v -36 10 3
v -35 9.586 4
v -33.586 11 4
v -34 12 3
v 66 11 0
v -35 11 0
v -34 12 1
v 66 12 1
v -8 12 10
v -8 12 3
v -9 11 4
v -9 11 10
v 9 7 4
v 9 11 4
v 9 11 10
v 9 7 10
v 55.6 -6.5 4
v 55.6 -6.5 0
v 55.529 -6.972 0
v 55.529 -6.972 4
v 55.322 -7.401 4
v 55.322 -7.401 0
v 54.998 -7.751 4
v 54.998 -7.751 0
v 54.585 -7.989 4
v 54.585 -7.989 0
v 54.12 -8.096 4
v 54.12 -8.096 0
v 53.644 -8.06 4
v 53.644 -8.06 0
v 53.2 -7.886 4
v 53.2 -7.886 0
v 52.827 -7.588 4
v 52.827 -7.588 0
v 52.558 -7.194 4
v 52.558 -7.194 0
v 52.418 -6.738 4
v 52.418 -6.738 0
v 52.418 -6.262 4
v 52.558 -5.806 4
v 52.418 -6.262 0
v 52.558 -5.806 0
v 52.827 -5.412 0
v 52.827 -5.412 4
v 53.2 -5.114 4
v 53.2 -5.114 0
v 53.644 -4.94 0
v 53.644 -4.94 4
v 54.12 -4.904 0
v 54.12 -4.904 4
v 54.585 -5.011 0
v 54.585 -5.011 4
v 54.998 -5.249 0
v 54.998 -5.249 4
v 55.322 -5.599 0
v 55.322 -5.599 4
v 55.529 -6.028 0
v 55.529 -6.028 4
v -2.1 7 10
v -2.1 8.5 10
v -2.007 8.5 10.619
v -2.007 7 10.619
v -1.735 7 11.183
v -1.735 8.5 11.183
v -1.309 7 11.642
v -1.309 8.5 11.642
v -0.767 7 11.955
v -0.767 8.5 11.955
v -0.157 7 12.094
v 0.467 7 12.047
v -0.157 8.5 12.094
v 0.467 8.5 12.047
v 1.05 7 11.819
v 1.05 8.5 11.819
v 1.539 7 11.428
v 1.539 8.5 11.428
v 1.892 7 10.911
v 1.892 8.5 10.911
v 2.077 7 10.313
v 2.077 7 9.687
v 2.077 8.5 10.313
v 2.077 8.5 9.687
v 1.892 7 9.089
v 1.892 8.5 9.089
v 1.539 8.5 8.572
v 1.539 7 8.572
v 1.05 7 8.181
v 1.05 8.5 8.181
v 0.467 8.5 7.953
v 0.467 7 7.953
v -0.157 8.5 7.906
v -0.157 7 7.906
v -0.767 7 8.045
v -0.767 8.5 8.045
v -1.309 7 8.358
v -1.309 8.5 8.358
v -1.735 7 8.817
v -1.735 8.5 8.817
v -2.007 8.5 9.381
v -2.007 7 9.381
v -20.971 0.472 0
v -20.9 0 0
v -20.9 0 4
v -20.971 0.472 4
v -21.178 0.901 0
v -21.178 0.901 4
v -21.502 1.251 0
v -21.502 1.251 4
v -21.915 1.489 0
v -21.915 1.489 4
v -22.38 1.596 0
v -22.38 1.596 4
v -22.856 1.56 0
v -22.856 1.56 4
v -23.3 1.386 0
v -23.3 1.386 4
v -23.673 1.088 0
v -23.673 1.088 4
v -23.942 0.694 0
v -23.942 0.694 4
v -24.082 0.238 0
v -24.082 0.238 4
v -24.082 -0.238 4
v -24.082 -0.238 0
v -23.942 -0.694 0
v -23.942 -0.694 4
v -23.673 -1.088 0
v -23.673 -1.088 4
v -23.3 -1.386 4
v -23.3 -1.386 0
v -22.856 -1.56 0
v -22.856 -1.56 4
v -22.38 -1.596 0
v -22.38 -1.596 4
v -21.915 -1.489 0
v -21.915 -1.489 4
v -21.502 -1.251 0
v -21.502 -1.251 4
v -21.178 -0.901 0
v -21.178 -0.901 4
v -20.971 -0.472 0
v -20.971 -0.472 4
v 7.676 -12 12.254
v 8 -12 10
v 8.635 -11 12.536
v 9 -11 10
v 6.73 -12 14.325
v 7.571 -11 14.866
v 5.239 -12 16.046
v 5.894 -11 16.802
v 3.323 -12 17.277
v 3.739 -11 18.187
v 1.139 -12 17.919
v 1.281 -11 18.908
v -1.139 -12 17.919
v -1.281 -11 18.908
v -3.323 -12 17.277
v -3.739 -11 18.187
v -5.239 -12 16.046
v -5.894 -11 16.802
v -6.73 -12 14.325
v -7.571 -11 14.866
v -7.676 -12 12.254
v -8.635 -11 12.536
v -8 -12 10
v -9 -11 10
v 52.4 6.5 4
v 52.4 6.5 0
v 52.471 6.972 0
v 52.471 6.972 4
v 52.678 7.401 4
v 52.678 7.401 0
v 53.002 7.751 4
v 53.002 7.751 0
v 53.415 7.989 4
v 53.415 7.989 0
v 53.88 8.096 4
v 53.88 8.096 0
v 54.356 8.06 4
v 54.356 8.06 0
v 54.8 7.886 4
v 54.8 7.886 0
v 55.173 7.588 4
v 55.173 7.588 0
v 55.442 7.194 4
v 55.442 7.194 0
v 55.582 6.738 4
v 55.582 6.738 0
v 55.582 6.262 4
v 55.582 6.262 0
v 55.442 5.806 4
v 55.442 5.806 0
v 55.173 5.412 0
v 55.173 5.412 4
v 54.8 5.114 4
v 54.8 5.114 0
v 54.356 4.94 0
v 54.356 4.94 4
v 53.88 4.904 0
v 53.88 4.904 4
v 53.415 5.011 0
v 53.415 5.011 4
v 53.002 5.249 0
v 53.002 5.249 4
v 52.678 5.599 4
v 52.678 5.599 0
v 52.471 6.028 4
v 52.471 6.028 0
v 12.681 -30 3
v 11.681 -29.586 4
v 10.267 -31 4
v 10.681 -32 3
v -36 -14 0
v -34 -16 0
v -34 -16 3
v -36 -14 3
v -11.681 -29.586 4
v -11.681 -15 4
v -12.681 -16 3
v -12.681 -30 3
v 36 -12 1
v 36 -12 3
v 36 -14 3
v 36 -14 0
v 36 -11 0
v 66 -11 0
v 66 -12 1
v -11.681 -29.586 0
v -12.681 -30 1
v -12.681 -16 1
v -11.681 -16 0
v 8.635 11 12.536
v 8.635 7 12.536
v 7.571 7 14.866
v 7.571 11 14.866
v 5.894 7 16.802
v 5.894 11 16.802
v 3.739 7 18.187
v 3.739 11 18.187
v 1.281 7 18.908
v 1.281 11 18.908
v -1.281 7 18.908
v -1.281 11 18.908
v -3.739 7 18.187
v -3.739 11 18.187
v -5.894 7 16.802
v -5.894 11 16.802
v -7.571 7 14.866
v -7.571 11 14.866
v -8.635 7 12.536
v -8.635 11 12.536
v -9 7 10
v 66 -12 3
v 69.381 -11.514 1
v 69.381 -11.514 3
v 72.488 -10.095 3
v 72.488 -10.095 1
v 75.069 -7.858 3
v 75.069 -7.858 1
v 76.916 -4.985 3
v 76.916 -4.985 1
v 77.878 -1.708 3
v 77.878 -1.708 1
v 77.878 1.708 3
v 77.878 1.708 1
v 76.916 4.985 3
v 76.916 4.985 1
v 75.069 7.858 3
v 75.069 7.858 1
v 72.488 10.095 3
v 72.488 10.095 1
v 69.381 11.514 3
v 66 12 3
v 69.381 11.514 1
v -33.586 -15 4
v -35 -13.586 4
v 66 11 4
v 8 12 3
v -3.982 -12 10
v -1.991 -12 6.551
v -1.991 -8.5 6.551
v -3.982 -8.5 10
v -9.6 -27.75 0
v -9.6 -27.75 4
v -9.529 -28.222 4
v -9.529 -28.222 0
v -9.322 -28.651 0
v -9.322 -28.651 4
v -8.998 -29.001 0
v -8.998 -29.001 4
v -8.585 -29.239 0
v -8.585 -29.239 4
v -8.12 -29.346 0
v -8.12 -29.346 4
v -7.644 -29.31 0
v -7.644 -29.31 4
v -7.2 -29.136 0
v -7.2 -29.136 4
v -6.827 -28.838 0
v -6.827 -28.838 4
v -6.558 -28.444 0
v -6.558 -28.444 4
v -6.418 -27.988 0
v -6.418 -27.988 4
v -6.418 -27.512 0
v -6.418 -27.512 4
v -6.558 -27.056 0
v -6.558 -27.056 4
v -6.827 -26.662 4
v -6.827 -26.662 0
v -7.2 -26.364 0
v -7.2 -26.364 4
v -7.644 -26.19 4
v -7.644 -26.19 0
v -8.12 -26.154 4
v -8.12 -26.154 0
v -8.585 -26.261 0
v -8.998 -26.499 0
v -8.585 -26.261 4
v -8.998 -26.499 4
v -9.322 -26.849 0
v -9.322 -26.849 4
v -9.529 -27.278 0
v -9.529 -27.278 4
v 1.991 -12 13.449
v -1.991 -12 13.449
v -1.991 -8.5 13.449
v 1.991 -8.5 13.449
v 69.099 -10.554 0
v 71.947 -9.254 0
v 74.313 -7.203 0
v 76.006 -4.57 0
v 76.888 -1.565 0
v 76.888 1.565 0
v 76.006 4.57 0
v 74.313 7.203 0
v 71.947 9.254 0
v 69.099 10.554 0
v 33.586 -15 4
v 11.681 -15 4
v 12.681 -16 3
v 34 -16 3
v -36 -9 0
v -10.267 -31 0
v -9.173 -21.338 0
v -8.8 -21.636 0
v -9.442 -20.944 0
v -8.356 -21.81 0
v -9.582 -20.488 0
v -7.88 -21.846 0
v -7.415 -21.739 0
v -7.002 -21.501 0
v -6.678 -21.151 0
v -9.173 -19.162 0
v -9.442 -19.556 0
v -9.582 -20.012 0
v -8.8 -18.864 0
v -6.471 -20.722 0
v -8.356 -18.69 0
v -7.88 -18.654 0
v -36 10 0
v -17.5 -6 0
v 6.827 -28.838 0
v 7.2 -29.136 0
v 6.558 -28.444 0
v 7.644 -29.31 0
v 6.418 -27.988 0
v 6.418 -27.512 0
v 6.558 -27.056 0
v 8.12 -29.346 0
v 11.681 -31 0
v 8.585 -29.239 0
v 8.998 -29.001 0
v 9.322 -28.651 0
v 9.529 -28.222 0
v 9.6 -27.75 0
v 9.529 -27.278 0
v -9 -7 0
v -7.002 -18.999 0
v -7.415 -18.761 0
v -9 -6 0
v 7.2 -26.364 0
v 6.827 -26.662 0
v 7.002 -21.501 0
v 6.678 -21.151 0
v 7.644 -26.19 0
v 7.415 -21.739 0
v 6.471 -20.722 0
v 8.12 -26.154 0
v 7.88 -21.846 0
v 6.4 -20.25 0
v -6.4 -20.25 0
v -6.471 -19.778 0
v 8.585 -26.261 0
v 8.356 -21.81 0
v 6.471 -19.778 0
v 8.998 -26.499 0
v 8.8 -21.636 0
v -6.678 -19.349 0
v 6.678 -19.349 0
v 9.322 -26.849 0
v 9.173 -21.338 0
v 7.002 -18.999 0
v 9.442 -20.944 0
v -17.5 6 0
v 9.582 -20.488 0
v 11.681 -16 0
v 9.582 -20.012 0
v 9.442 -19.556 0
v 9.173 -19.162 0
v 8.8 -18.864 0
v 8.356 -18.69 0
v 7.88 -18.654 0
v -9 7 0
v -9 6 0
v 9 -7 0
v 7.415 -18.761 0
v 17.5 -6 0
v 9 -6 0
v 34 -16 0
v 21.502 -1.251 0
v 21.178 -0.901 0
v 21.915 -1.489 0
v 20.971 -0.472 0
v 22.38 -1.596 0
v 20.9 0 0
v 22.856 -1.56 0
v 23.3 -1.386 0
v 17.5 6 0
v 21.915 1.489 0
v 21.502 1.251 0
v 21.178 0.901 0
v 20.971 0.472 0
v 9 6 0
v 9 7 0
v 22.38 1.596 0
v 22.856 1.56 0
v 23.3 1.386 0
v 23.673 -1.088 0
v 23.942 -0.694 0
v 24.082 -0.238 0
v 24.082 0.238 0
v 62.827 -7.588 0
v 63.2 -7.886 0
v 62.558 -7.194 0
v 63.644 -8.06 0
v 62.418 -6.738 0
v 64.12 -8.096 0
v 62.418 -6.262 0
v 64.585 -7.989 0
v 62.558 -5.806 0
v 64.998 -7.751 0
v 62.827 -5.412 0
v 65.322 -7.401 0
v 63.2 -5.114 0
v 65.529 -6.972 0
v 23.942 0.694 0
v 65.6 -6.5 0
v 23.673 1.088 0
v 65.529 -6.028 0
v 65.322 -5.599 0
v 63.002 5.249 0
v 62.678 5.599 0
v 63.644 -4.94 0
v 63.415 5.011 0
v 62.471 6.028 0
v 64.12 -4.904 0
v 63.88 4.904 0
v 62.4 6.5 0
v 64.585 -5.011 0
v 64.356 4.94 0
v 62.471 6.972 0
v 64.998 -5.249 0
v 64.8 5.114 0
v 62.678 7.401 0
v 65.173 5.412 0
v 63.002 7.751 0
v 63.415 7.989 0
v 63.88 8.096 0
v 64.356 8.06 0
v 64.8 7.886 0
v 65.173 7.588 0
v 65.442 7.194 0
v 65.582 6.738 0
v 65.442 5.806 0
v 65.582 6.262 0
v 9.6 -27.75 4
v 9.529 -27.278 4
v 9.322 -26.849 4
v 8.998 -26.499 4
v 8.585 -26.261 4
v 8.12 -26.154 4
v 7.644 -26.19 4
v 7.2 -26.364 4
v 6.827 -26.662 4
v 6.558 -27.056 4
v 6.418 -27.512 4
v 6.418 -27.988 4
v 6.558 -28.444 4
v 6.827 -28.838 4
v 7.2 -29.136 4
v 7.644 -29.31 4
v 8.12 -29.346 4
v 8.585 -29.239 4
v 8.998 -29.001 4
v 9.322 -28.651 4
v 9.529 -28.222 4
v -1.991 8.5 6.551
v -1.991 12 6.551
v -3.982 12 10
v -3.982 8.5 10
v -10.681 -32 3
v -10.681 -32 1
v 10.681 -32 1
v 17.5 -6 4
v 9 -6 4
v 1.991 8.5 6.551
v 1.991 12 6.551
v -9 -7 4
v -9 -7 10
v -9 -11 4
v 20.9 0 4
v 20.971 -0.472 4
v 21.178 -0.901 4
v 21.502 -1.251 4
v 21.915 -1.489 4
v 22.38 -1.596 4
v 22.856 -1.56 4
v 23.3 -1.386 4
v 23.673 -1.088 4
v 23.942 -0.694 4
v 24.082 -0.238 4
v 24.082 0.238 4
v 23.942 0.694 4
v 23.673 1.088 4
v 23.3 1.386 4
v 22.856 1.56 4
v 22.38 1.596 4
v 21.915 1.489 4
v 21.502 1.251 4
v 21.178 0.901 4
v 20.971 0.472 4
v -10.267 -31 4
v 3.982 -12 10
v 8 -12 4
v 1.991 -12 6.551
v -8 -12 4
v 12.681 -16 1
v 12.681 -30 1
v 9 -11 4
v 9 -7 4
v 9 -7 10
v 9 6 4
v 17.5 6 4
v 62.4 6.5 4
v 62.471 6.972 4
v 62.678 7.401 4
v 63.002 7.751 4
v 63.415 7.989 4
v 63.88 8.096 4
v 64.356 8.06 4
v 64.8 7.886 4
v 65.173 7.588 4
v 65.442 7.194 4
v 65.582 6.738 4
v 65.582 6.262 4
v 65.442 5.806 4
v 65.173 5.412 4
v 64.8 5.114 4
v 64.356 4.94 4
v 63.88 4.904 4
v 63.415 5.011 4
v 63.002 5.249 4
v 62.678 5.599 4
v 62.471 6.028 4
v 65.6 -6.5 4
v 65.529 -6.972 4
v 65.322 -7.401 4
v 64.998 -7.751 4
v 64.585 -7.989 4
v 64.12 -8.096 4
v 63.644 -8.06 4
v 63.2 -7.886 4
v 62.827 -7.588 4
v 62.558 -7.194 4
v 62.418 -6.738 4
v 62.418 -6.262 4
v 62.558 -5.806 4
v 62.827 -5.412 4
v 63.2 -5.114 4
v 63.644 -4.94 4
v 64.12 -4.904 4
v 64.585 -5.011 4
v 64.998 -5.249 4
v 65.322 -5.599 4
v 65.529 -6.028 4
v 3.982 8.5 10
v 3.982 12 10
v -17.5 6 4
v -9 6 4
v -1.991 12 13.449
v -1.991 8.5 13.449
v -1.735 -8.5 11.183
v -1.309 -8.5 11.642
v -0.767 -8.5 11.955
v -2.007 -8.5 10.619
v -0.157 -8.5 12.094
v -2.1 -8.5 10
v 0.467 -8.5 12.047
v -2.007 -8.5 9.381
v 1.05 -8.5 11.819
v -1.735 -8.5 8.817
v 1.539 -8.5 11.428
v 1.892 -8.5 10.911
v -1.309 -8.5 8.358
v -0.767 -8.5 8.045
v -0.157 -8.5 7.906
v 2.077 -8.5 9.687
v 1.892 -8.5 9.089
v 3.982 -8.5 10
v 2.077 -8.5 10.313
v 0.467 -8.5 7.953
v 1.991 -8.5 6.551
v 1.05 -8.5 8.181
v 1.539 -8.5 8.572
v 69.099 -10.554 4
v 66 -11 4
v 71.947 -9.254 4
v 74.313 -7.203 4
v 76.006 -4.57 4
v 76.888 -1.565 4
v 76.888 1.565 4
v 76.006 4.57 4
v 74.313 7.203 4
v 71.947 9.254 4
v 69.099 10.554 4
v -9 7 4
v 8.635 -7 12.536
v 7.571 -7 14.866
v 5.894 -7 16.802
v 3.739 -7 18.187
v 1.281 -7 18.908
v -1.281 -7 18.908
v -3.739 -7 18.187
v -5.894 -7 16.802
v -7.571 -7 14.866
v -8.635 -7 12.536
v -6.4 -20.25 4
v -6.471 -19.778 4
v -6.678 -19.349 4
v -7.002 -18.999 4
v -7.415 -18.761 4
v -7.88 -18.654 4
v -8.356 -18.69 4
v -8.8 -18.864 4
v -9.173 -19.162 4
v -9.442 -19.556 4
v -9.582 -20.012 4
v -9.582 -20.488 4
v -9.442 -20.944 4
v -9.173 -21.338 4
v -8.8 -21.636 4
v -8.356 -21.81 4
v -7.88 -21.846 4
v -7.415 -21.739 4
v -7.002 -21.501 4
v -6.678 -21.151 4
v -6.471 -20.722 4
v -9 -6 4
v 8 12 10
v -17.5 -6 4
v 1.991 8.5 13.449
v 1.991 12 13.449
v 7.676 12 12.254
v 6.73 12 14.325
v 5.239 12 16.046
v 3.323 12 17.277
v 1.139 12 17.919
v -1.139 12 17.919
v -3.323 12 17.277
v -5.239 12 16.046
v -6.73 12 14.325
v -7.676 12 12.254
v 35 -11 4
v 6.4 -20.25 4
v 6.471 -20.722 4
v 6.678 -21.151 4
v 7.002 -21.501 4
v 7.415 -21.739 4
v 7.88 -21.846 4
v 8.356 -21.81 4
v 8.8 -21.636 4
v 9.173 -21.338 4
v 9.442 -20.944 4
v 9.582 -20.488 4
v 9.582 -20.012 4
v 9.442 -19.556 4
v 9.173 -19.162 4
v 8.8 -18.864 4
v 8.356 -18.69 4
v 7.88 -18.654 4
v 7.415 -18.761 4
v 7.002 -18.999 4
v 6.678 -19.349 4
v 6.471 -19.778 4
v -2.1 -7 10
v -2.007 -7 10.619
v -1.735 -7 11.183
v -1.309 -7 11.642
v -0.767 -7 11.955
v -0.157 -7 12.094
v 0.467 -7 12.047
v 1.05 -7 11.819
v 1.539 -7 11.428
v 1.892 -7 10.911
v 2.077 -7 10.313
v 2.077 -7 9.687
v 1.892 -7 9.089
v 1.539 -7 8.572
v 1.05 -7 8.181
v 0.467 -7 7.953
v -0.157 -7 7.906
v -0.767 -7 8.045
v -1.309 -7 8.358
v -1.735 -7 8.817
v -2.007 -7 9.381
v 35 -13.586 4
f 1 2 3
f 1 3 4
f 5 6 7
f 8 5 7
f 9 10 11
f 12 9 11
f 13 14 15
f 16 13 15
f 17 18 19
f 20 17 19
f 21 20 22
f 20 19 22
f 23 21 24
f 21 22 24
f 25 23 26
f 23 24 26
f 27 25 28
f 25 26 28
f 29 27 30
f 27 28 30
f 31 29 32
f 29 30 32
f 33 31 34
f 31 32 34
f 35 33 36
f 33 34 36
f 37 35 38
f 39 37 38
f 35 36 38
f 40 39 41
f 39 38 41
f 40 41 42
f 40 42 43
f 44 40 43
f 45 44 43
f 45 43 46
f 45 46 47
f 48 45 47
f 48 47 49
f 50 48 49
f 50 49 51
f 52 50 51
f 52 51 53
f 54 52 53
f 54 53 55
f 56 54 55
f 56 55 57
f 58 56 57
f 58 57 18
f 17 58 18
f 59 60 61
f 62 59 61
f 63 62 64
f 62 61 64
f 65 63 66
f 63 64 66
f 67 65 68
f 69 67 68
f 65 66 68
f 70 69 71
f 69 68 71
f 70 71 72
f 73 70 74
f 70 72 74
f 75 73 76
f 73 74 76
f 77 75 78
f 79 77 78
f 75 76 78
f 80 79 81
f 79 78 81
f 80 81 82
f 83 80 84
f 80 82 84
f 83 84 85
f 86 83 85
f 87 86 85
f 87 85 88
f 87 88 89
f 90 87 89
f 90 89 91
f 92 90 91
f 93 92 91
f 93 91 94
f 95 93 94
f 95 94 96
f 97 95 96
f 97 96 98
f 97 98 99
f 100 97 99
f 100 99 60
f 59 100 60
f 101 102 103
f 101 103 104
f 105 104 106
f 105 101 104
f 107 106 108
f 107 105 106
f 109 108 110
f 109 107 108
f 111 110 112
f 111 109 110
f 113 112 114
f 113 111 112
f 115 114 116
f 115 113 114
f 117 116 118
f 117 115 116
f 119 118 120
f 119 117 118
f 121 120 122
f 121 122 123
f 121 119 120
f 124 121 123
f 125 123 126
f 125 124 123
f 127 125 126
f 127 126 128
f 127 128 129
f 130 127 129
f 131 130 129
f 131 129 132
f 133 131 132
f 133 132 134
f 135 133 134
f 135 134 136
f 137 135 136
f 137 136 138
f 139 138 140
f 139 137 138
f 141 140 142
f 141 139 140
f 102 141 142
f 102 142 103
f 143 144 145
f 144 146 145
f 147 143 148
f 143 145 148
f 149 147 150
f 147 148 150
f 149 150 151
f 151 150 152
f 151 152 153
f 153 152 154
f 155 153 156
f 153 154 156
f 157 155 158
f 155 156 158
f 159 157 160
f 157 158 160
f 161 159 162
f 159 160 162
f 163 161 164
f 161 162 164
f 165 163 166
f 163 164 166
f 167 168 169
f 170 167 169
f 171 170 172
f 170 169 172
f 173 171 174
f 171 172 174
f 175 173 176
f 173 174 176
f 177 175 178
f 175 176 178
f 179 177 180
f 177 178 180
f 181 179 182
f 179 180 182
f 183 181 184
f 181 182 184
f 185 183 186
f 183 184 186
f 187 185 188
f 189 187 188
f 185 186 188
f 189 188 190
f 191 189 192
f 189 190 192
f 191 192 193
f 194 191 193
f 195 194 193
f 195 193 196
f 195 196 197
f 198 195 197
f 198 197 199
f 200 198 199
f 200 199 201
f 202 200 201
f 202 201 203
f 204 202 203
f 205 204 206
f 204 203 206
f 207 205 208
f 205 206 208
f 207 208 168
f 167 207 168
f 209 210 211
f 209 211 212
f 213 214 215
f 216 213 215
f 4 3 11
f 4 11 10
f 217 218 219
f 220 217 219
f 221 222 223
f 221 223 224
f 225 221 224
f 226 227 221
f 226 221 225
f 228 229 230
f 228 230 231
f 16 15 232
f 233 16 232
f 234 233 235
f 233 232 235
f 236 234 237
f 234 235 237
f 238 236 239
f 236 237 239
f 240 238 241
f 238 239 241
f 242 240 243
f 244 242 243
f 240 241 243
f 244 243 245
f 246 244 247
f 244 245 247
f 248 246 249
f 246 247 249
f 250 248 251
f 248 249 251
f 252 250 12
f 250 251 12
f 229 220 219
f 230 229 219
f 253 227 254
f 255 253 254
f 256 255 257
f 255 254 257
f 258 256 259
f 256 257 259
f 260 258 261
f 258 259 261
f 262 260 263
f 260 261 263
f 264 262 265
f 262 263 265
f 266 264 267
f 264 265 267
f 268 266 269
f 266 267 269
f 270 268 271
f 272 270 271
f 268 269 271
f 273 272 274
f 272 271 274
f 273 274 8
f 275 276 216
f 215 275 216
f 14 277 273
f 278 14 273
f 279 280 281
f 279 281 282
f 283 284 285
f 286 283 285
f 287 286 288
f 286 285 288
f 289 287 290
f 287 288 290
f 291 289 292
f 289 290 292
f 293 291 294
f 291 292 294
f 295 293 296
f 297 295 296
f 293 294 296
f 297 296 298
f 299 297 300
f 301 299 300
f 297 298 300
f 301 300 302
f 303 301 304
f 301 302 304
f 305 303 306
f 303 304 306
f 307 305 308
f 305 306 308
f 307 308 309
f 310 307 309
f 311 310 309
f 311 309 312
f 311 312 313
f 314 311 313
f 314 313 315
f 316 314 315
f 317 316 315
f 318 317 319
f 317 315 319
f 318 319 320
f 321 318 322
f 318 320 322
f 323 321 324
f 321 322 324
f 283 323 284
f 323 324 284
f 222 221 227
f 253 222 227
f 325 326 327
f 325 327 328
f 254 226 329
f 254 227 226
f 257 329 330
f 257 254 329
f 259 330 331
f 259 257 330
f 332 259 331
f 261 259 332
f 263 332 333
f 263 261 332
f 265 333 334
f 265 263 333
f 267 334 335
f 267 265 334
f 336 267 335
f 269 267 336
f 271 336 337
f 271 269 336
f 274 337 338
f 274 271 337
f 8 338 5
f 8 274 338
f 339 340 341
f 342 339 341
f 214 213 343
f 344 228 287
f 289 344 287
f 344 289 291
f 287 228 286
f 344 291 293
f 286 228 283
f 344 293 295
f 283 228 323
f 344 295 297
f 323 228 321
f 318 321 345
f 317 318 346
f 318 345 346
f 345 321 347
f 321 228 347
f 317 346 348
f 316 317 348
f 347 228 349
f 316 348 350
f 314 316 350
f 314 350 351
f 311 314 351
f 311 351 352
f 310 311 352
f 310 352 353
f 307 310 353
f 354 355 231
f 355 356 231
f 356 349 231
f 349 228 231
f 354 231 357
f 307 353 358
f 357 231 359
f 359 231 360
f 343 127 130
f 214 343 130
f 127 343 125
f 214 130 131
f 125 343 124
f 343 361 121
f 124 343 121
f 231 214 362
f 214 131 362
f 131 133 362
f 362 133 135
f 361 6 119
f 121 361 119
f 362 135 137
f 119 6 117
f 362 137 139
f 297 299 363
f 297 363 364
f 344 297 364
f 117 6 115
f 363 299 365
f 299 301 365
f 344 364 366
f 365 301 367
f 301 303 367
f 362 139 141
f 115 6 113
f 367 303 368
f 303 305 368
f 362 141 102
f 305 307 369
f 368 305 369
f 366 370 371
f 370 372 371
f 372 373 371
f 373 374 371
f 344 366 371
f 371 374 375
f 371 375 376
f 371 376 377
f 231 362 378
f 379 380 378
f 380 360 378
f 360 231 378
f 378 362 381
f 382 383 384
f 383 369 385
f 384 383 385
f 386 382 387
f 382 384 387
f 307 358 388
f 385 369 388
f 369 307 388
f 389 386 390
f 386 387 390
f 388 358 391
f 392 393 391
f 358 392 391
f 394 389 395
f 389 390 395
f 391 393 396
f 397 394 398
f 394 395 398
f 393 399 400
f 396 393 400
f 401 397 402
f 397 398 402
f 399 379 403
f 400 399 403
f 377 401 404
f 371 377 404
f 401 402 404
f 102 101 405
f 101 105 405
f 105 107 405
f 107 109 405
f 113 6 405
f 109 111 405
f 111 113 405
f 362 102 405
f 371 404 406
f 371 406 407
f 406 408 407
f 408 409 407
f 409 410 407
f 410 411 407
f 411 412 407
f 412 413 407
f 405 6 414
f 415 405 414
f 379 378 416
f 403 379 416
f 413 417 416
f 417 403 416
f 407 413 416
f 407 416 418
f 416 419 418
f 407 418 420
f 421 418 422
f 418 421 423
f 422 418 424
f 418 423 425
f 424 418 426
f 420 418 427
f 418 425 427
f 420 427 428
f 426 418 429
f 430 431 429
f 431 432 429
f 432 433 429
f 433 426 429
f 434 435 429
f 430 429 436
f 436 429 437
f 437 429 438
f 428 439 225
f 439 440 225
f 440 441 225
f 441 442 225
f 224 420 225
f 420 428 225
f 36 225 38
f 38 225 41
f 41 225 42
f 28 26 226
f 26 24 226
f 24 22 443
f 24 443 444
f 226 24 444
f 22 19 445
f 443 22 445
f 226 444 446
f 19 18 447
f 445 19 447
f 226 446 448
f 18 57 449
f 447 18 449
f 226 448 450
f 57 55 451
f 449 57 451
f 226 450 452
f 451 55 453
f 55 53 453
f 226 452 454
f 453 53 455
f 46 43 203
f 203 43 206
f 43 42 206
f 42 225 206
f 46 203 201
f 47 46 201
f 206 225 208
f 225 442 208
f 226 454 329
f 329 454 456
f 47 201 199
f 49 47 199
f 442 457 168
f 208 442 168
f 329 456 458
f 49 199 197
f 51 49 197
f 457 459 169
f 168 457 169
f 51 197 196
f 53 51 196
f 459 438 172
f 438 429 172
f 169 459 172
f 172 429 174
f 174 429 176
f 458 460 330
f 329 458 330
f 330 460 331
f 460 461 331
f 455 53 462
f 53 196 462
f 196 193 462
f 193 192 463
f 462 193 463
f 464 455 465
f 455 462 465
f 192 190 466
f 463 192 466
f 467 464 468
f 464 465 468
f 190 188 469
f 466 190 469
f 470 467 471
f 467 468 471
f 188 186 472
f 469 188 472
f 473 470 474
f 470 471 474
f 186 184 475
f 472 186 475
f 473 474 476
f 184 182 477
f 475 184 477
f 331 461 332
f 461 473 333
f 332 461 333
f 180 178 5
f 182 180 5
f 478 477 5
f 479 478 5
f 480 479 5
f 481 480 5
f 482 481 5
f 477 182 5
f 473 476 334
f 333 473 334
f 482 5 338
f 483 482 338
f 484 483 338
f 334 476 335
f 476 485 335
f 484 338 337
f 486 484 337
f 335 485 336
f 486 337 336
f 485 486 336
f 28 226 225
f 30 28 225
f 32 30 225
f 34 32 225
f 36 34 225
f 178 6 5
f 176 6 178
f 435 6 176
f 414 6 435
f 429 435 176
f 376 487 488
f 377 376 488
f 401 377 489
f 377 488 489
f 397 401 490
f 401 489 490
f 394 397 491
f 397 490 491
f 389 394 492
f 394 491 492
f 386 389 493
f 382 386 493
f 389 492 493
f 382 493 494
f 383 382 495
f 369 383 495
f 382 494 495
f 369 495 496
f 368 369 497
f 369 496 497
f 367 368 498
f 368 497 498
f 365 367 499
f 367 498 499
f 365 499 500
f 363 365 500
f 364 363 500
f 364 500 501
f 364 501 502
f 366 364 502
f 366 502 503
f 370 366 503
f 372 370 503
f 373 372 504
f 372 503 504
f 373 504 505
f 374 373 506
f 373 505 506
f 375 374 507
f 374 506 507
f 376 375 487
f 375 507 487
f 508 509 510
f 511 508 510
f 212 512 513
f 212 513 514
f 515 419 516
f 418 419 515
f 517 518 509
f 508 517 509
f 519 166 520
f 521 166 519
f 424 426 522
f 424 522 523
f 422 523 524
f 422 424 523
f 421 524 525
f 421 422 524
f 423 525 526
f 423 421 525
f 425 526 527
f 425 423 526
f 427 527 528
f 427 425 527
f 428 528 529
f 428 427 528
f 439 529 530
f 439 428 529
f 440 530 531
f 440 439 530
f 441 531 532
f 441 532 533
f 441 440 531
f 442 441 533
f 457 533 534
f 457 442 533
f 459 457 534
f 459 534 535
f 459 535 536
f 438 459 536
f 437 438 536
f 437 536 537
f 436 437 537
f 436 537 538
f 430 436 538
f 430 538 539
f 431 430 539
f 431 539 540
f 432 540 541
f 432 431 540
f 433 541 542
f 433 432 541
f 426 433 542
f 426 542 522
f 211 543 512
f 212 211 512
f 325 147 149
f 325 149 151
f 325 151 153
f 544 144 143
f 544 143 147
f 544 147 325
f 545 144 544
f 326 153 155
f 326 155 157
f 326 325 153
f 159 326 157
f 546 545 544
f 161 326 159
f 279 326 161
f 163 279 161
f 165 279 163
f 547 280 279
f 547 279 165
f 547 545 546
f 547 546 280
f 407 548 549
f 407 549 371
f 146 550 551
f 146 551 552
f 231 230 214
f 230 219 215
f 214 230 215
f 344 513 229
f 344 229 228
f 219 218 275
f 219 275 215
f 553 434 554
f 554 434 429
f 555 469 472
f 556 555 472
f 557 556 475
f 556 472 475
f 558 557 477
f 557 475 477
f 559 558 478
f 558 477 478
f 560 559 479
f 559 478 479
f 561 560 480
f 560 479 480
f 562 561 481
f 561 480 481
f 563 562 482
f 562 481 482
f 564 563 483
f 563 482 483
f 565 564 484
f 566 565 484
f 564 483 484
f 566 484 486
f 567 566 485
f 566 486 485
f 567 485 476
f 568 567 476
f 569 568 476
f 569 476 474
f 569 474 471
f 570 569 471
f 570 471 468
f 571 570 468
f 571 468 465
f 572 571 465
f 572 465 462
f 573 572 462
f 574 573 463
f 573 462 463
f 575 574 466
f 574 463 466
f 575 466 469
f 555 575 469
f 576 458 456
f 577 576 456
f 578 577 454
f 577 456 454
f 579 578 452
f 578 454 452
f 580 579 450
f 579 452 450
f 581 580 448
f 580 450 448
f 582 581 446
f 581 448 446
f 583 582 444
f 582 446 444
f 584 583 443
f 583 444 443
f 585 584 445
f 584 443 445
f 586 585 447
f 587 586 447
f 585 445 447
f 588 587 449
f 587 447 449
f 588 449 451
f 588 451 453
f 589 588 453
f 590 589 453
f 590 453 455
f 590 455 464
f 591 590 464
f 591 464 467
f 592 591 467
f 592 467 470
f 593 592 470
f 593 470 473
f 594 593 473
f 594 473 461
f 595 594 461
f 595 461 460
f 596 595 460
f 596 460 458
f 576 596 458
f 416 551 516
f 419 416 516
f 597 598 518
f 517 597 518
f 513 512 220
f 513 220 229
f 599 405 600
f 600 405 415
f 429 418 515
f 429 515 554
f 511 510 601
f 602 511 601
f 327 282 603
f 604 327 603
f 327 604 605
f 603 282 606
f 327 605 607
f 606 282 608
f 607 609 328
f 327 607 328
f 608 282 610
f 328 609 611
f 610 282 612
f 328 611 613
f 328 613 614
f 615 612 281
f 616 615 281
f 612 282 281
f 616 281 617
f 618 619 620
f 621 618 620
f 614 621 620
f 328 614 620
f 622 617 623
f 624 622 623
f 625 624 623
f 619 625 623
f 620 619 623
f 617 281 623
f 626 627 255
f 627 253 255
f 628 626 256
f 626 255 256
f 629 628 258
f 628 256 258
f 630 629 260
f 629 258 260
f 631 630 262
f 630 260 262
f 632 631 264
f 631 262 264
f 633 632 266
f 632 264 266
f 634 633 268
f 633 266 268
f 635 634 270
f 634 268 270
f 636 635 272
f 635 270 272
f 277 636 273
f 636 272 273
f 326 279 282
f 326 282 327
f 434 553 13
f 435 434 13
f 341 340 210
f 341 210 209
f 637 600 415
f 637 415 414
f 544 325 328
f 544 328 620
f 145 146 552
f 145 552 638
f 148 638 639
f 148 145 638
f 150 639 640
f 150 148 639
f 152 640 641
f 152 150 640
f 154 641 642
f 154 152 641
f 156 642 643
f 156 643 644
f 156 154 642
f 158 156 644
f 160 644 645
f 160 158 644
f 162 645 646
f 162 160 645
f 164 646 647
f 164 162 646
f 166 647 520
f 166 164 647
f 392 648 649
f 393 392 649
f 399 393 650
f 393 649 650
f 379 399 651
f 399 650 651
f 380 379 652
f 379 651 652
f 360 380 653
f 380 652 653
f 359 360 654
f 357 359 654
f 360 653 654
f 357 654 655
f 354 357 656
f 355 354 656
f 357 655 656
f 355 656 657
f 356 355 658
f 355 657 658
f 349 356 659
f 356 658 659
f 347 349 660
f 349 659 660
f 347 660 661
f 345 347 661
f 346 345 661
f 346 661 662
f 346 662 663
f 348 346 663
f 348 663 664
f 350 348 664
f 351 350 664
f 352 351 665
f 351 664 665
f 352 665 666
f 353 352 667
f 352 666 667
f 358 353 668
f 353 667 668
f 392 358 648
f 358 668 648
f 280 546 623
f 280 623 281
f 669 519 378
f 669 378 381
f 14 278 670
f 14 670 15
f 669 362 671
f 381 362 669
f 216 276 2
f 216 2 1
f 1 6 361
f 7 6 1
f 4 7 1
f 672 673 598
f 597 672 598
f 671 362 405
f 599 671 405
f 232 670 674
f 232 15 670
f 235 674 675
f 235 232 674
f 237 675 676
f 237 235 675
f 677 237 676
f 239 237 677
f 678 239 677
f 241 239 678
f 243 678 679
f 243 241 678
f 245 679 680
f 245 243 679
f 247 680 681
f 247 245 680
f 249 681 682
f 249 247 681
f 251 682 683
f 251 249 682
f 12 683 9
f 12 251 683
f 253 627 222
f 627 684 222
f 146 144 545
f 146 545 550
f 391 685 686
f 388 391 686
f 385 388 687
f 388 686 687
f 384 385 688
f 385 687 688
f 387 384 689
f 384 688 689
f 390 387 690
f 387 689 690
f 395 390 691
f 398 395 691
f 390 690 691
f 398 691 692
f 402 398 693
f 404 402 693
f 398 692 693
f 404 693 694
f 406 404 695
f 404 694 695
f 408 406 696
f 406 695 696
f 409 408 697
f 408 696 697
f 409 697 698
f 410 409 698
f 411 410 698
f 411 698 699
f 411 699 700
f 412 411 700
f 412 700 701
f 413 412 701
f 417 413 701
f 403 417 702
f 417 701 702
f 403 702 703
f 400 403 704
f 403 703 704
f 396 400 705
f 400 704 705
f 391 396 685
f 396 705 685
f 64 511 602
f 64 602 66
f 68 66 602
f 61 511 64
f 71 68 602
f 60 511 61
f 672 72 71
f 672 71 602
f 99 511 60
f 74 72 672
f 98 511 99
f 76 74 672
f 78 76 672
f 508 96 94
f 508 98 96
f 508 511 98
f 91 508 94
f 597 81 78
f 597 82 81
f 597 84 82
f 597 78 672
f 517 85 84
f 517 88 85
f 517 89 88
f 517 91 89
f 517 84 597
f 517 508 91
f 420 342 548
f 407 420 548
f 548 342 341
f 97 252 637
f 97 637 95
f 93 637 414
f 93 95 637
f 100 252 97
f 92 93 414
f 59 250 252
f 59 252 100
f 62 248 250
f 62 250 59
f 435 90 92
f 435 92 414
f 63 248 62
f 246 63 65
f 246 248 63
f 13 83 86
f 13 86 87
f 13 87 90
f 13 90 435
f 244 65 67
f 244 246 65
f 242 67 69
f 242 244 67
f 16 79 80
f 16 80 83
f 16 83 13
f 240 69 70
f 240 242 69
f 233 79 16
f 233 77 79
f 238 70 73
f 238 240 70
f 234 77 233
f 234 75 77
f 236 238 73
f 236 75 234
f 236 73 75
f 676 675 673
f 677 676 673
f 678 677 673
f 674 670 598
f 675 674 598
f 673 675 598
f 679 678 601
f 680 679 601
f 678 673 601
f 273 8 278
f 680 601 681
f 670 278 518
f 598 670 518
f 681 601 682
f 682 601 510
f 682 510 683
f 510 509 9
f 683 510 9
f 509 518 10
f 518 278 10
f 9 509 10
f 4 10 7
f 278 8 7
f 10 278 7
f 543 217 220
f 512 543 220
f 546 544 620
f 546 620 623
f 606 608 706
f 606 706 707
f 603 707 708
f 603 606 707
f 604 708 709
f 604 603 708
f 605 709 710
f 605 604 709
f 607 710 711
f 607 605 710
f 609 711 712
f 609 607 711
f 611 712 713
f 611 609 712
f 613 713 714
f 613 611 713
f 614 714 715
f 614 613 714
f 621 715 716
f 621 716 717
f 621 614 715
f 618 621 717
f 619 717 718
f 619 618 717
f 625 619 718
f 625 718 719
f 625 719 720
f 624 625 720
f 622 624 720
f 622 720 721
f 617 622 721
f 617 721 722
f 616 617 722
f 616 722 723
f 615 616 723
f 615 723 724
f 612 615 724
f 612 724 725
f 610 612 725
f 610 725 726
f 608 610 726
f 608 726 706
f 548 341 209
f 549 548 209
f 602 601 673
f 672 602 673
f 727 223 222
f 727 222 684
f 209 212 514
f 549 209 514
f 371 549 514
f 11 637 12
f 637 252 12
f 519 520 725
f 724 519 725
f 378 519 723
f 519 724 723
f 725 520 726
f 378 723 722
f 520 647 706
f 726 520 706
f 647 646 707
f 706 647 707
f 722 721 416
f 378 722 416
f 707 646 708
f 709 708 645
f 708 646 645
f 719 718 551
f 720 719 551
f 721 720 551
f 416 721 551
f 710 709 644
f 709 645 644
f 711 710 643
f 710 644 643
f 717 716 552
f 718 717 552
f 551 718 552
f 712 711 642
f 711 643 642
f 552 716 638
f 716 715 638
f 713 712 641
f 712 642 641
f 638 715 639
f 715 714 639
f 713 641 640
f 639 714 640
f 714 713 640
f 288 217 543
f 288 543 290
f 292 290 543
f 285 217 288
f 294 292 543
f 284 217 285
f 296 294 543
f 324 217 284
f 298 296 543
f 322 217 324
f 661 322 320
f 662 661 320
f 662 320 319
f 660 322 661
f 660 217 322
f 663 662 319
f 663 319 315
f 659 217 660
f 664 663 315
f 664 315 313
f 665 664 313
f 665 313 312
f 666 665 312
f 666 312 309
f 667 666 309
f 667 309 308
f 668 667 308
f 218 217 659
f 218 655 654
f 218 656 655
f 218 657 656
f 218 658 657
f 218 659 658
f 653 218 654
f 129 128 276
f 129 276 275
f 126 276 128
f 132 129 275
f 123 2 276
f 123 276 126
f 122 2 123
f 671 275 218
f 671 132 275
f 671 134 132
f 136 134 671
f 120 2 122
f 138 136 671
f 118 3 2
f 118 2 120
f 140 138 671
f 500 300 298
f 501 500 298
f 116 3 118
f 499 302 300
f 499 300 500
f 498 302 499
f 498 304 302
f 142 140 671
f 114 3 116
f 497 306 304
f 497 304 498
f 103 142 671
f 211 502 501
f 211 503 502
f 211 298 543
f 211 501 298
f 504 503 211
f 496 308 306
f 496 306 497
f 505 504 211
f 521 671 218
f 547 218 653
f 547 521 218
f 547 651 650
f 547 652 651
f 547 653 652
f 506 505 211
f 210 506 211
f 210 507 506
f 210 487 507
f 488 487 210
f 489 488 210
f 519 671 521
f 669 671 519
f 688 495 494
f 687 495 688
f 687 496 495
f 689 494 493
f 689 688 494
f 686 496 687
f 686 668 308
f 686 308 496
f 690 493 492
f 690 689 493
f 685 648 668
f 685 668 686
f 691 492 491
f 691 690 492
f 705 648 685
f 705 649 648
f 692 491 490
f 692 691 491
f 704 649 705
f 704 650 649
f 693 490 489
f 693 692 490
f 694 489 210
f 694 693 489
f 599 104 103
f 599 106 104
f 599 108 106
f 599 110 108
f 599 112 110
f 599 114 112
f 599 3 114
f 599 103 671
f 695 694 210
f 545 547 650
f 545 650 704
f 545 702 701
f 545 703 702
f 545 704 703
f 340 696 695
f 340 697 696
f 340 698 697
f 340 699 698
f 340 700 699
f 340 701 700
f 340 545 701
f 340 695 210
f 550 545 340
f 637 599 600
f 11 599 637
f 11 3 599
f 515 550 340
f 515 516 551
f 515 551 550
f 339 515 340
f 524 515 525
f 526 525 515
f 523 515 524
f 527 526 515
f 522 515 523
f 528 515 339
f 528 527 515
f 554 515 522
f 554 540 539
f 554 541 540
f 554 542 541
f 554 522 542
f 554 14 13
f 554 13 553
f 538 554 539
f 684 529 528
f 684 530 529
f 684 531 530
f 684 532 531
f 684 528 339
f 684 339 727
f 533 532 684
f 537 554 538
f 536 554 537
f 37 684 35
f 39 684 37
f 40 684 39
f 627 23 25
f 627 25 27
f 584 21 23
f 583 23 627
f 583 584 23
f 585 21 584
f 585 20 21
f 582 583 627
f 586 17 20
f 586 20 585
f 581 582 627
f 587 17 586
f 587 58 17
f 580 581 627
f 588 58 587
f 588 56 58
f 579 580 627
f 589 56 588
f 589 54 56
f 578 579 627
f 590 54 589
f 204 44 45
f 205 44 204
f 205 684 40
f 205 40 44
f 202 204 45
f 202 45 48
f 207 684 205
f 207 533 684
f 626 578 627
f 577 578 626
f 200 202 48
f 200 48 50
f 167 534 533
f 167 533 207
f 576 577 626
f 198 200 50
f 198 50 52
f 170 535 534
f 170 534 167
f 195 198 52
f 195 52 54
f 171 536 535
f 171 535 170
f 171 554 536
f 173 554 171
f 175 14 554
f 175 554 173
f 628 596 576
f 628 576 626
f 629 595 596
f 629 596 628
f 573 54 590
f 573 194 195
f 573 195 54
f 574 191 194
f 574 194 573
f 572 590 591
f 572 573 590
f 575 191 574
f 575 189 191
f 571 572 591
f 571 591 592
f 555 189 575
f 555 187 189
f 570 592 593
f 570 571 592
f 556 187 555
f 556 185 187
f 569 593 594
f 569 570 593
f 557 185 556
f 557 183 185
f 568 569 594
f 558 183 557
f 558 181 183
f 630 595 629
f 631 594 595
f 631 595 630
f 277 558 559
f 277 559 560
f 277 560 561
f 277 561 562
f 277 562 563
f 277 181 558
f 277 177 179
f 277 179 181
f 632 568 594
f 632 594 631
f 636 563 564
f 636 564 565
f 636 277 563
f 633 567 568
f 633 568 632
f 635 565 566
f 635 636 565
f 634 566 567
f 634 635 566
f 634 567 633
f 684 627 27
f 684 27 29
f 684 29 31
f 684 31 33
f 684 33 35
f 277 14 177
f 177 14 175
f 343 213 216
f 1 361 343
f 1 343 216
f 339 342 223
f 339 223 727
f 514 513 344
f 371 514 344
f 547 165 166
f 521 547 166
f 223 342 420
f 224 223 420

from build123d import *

# Parameters (mm, degrees)
CROQUIS1_W              = 72
CROQUIS1_H              = 24
CROQUIS1_R              = 1.6
CROQUIS1_W_2            = 35
CROQUIS1_H_2            = 12
SALIENTE_EXTRUIR1_DEPTH = 4
CROQUIS2_R              = 3.125
SALIENTE_EXTRUIR2_DEPTH = 4
CROQUIS3_R              = 1.6
SALIENTE_EXTRUIR3_DEPTH = 4
CROQUIS5_R              = 2.1
SALIENTE_EXTRUIR4_DEPTH = 5
CORTAR_EXTRUIR1_DEPTH   = 3.5
REDONDEO1_R             = 3
CROQUIS7_W              = 25.361567636
CROQUIS7_H              = 16
CROQUIS7_R              = 1.6
SALIENTE_EXTRUIR5_DEPTH = 4
CHAFL_N1_SIZE           = 2
CHAFL_N2_SIZE           = 1
CROQUIS8_W              = 18
CROQUIS8_H              = 14
CORTAR_EXTRUIR2_DEPTH   = 87.423376467
CROQUIS9_W              = 19.069204895
CROQUIS9_H              = 8.04839492
CORTAR_EXTRUIR3_DEPTH   = 120.920807202


with BuildPart() as part:
    # Croquis1 → Saliente-Extruir1 (new body)
    with BuildSketch(Plane.XY):
        Rectangle(CROQUIS1_W, CROQUIS1_H)
        with Locations((-22.5, 0)):
            Circle(CROQUIS1_R, mode=Mode.SUBTRACT)
        with Locations(Location((22.5, 0, 0), (0, 0, 180))):
            Circle(CROQUIS1_R, mode=Mode.SUBTRACT)
        Rectangle(CROQUIS1_W_2, CROQUIS1_H_2, mode=Mode.SUBTRACT)
    extrude(amount=SALIENTE_EXTRUIR1_DEPTH)

    # Croquis2 → Saliente-Extruir2 (add)
    with BuildSketch(Plane.XZ.offset(12)):
        with BuildLine():
            Line((-5, -10), (-5, -4))
            Line((-5, -4), (-36, -4))
            Line((-36, -4), (-36, 4))
            Line((-36, 4), (36, 4))
            Line((36, 4), (36, -4))
            Line((36, -4), (5, -4))
            Line((5, -4), (5, -10))
            ThreePointArc((5, -10), (0, -15), (-5, -10))
        make_face()
        with Locations((0, -10)):
            Circle(CROQUIS2_R, mode=Mode.SUBTRACT)
    extrude(amount=SALIENTE_EXTRUIR2_DEPTH)

    # Croquis3 → Saliente-Extruir3 (add)
    with BuildSketch(Plane(origin=(0, 0, 0), x_dir=(-1, 0, 0), z_dir=(0, 0, -1))):
        with BuildLine():
            Line((-66, 12), (-36, 12))
            Line((-36, 12), (-36, -12))
            Line((-36, -12), (-66, -12))
            ThreePointArc((-66, -12), (-78, 0), (-66, 12))
        make_face()
        with Locations((-54, 6.5)):
            Circle(CROQUIS3_R, mode=Mode.SUBTRACT)
        with Locations((-64, 6.5)):
            Circle(CROQUIS3_R, mode=Mode.SUBTRACT)
        with Locations(Location((-54, -6.5, 0), (0, 0, 180))):
            Circle(CROQUIS3_R, mode=Mode.SUBTRACT)
        with Locations(Location((-64, -6.5, 0), (0, 0, 180))):
            Circle(CROQUIS3_R, mode=Mode.SUBTRACT)
    extrude(amount=-SALIENTE_EXTRUIR3_DEPTH)

    # Croquis5 → Saliente-Extruir4 (add)
    with BuildSketch(Plane(origin=(0, 12, 0), x_dir=(1, 0, 0), z_dir=(0, 1, 0))):
        with BuildLine():
            Line((-9, -10), (-9, -4))
            Line((-9, -4), (9, -4))
            Line((9, -4), (9, -10))
            ThreePointArc((9, -10), (0, -19), (-9, -10))
        make_face()
        with Locations(Location((0, -10, 0), (0, 0, 180))):
            Circle(CROQUIS5_R, mode=Mode.SUBTRACT)
    saliente_extruir4 = extrude(amount=-SALIENTE_EXTRUIR4_DEPTH)

    # Croquis6 → Cortar-Extruir1 (cut)
    with BuildSketch(Plane(origin=(0, 12, 0), x_dir=(1, 0, 0), z_dir=(0, 1, 0))):
        Polygon((3.982338332, -10), (1.991169166, -6.551193838), (-1.991169166, -6.551193838), (-3.982338332, -10), (-1.991169166, -13.448806162), (1.991169166, -13.448806162), align=None)
    cortar_extruir1 = extrude(amount=-CORTAR_EXTRUIR1_DEPTH, mode=Mode.SUBTRACT)

    # Simetría1: Saliente-Extruir4, Cortar-Extruir1 across plane
    add(saliente_extruir4.mirror(Plane.ZX))
    add(cortar_extruir1.mirror(Plane.ZX), mode=Mode.SUBTRACT)

    # Redondeo1
    redondeo1_edges = [part.edges().sort_by_distance(p)[0] for p in [
        (0, -12, 0),
    ]]
    fillet(redondeo1_edges, radius=REDONDEO1_R)

    # Croquis7 → Saliente-Extruir5 (add)
    with BuildSketch(Plane.XY.offset(4)):
        with Locations((0, -24)):
            Rectangle(CROQUIS7_W, CROQUIS7_H)
        with Locations((-8, -20.25)):
            Circle(CROQUIS7_R, mode=Mode.SUBTRACT)
        with Locations(Location((8, -20.25, 0), (0, 0, 180))):
            Circle(CROQUIS7_R, mode=Mode.SUBTRACT)
        with Locations((8, -27.75)):
            Circle(CROQUIS7_R, mode=Mode.SUBTRACT)
        with Locations(Location((-8, -27.75, 0), (0, 0, 180))):
            Circle(CROQUIS7_R, mode=Mode.SUBTRACT)
    extrude(amount=-SALIENTE_EXTRUIR5_DEPTH)

    # Chaflán1
    chafl_n1_edges = [part.edges().sort_by_distance(p)[0] for p in [
        (12.680783818, -32, 2),
        (-12.680783818, -32, 2),
        (36, -16, 0),
        (-36, -16, 0),
        (-36, 12, 2),
    ]]
    chamfer(chafl_n1_edges, length=CHAFL_N1_SIZE)

    # Chaflán2
    # the kernel refuses this chamfer: 1 mm, written as the material it takes off along each edge
    with BuildSketch(Plane(origin=(0, -12, 10), x_dir=(1, 0, 0), z_dir=(0, 0, -1))) as chafl_n2_piece_1:
        Polygon((9 - CHAFL_N2_SIZE, 0), (9, -CHAFL_N2_SIZE), (9, 0), align=None)
    revolve(axis=Axis((0, -12, 10), (0, -1, 0)), revolution_arc=180, mode=Mode.SUBTRACT)
    with BuildSketch(Plane(origin=(9, -12, 4), x_dir=(-0.9996219169112968, -0.027495876610585623, 0), z_dir=(0, 0, 1)), Plane(origin=(-9, -12, 10), x_dir=(0.9996219169112968, -0.0274958766105856, 0), z_dir=(0, 0, -1))) as chafl_n2_piece_2:
        Polygon((CHAFL_N2_SIZE * 0.999621916911, -CHAFL_N2_SIZE * 0.0274958766106), (-CHAFL_N2_SIZE * 0.0274958766106, -CHAFL_N2_SIZE * 0.999621916911), (0, 0), align=None)
    extrude(amount=6, mode=Mode.SUBTRACT)
    with BuildSketch(Plane(origin=(-36.571682988, -16, 4), x_dir=(0, 0.9996219169112968, 0.02749587661058651), z_dir=(1, 0, 0)), Plane(origin=(12.680783818, -16, 4), x_dir=(0, 0.9996219169112968, 0.02749587661058651), z_dir=(1, 0, 0))) as chafl_n2_piece_3:
        Polygon((CHAFL_N2_SIZE * 0.999621916911, -CHAFL_N2_SIZE * 0.0274958766106), (-CHAFL_N2_SIZE * 0.0274958766106, -CHAFL_N2_SIZE * 0.999621916911), (0, 0), align=None)
    extrude(amount=23.89089917, mode=Mode.SUBTRACT)
    with BuildSketch(Plane(origin=(-12.680783818, -16, 0), x_dir=(-0.02749587661058563, 0, 0.9996219169112968), z_dir=(0, -1, 0)), Plane(origin=(-12.680783818, -16, 4), x_dir=(0.9996219169112968, 0, 0.02749587661058651), z_dir=(0, -1, 0)), Plane(origin=(12.680783818, -32.571682988, 4), x_dir=(-0.9996219169112968, 0, 0.02749587661058651), z_dir=(0, 1, 0)), Plane(origin=(12.680783818, -32.571682988, 0), x_dir=(0.02749587661058563, 0, 0.9996219169112968), z_dir=(0, 1, 0))) as chafl_n2_piece_4:
        Polygon((CHAFL_N2_SIZE * 0.999621916911, -CHAFL_N2_SIZE * 0.0274958766106), (-CHAFL_N2_SIZE * 0.0274958766106, -CHAFL_N2_SIZE * 0.999621916911), (0, 0), align=None)
    extrude(amount=16.571682988, mode=Mode.SUBTRACT)
    with BuildSketch(Plane(origin=(-36, 12.571682988, 4), x_dir=(0.9996219169112968, 0, 0.027495876610586414), z_dir=(0, -1, 0))) as chafl_n2_piece_5:
        Polygon((CHAFL_N2_SIZE * 0.999621916911, -CHAFL_N2_SIZE * 0.0274958766106), (-CHAFL_N2_SIZE * 0.0274958766106, -CHAFL_N2_SIZE * 0.999621916911), (0, 0), align=None)
    extrude(amount=29.143365976, mode=Mode.SUBTRACT)
    with BuildSketch(Plane(origin=(-13.252466806, -32, 4), x_dir=(0, 0.9996219169112968, 0.02749587661058651), z_dir=(1, 0, 0)), Plane(origin=(-13.252466806, -32, 0), x_dir=(0, -0.02749587661058908, 0.9996219169112968), z_dir=(1, 0, 0))) as chafl_n2_piece_6:
        Polygon((CHAFL_N2_SIZE * 0.999621916911, -CHAFL_N2_SIZE * 0.0274958766106), (-CHAFL_N2_SIZE * 0.0274958766106, -CHAFL_N2_SIZE * 0.999621916911), (0, 0), align=None)
    extrude(amount=26.504933612, mode=Mode.SUBTRACT)
    with BuildSketch(Plane(origin=(36, -12, 4), x_dir=(0.02749587661058907, 0, -0.9996219169112965), z_dir=(0, -1, 0))) as chafl_n2_piece_7:
        Polygon((CHAFL_N2_SIZE * 0.999621916911, -CHAFL_N2_SIZE * 0.0274958766106), (-CHAFL_N2_SIZE * 0.0274958766106, -CHAFL_N2_SIZE * 0.999621916911), (0, 0), align=None)
    extrude(amount=4.571682988, mode=Mode.SUBTRACT)
    with BuildSketch(Plane(origin=(14.499238298, -28.18154552, 4), x_dir=(-0.7068394360706736, 0.7068394360706736, 0.027495876610586528), z_dir=(-0.7071067811865476, -0.7071067811865476, 0)), Plane(origin=(-32.18154552, -17.81845448, 4), x_dir=(0.7068394360706736, 0.7068394360706736, 0.027495876610586563), z_dir=(-0.7071067811865476, 0.7071067811865476, 0)), Plane(origin=(-37.81845448, 8.18154552, 4), x_dir=(0.7068394360706736, -0.7068394360706736, 0.027495876610586462), z_dir=(0.7071067811865476, 0.7071067811865476, 0))) as chafl_n2_piece_8:
        Polygon((CHAFL_N2_SIZE * 0.999621916911, CHAFL_N2_SIZE * 0.0274958766106), (-CHAFL_N2_SIZE * 0.0274958766106, CHAFL_N2_SIZE * 0.999621916911), (0, 0), align=None)
    extrude(amount=7.971793101, mode=Mode.SUBTRACT)
    with BuildSketch(Plane(origin=(-14.499238298, -28.18154552, 4), x_dir=(0.7068394360706736, 0.7068394360706736, 0.027495876610586528), z_dir=(0.7071067811865476, -0.7071067811865476, 0)), Plane(origin=(37.81845448, -12.18154552, 4), x_dir=(0.019442520806013792, -0.019442520806013792, -0.9996219169112968), z_dir=(-0.7071067811865476, -0.7071067811865476, 0)), Plane(origin=(-14.499238298, -28.18154552, 0), x_dir=(-0.019442520806013792, -0.019442520806013792, 0.9996219169112968), z_dir=(0.7071067811865476, -0.7071067811865476, 0))) as chafl_n2_piece_9:
        Polygon((CHAFL_N2_SIZE * 0.999621916911, -CHAFL_N2_SIZE * 0.0274958766106), (-CHAFL_N2_SIZE * 0.0274958766106, -CHAFL_N2_SIZE * 0.999621916911), (0, 0), align=None)
    extrude(amount=7.971793101, mode=Mode.SUBTRACT)
    with BuildSketch(Plane(origin=(-36.571682988, 12, 0), x_dir=(0, -0.9996219169112968, -0.02749587661058639), z_dir=(1, 0, 0))) as chafl_n2_piece_10:
        Polygon((CHAFL_N2_SIZE * 0.999621916911, -CHAFL_N2_SIZE * 0.0274958766106), (-CHAFL_N2_SIZE * 0.0274958766106, -CHAFL_N2_SIZE * 0.999621916911), (0, 0), align=None)
    extrude(amount=102.571682988, mode=Mode.SUBTRACT)
    with BuildSketch(Plane(origin=(66, 0, 4), x_dir=(0, -1, 0), z_dir=(-1, 0, 0))) as chafl_n2_piece_11:
        Polygon((12 - CHAFL_N2_SIZE, 0), (12, -CHAFL_N2_SIZE), (12, 0), align=None)
    revolve(axis=Axis((66, 0, 4), (0, 0, 1)), revolution_arc=180, mode=Mode.SUBTRACT)
    with BuildSketch(Plane(origin=(66, 0, 0), x_dir=(0, -1, 0), z_dir=(-1, 0, 0))) as chafl_n2_piece_12:
        Polygon((12 - CHAFL_N2_SIZE, 0), (12, CHAFL_N2_SIZE), (12, 0), align=None)
    revolve(axis=Axis((66, 0, 0), (0, 0, 1)), revolution_arc=180, mode=Mode.SUBTRACT)
    with BuildSketch(Plane(origin=(36, -12, 0), x_dir=(0, -0.02749587661058563, 0.9996219169112968), z_dir=(1, 0, 0)), Plane(origin=(36, -12, 4), x_dir=(0, 0.9996219169112968, 0.02749587661058651), z_dir=(1, 0, 0))) as chafl_n2_piece_13:
        Polygon((CHAFL_N2_SIZE * 0.999621916911, -CHAFL_N2_SIZE * 0.0274958766106), (-CHAFL_N2_SIZE * 0.0274958766106, -CHAFL_N2_SIZE * 0.999621916911), (0, 0), align=None)
    extrude(amount=30, mode=Mode.SUBTRACT)
    with BuildSketch(Plane(origin=(-9, 12, 4), x_dir=(0, -0.9996219169112968, 0.02749587661058651), z_dir=(-1, 0, 0))) as chafl_n2_piece_14:
        Polygon((CHAFL_N2_SIZE * 0.999621916911, -CHAFL_N2_SIZE * 0.0274958766106), (-CHAFL_N2_SIZE * 0.0274958766106, -CHAFL_N2_SIZE * 0.999621916911), (0, 0), align=None)
    extrude(amount=27.571682988, mode=Mode.SUBTRACT)
    with BuildSketch(Plane(origin=(66, 12, 4), x_dir=(0, -0.9996219169112968, 0.02749587661058651), z_dir=(-1, 0, 0))) as chafl_n2_piece_15:
        Polygon((CHAFL_N2_SIZE * 0.999621916911, -CHAFL_N2_SIZE * 0.0274958766106), (-CHAFL_N2_SIZE * 0.0274958766106, -CHAFL_N2_SIZE * 0.999621916911), (0, 0), align=None)
    extrude(amount=57, mode=Mode.SUBTRACT)
    with BuildSketch(Plane(origin=(0, 12, 10), x_dir=(1, 0, 0), z_dir=(0, 0, -1))) as chafl_n2_piece_16:
        Polygon((9 - CHAFL_N2_SIZE, 0), (9, CHAFL_N2_SIZE), (9, 0), align=None)
    revolve(axis=Axis((0, 12, 10), (0, -1, 0)), revolution_arc=180, mode=Mode.SUBTRACT)
    with BuildSketch(Plane(origin=(9, 12, 4), x_dir=(-0.9996219169112968, 0.027495876610587396, 0), z_dir=(0, 0, 1)), Plane(origin=(-9, 12, 10), x_dir=(0.9996219169112968, 0.027495876610585623, 0), z_dir=(0, 0, -1))) as chafl_n2_piece_17:
        Polygon((CHAFL_N2_SIZE * 0.999621916911, CHAFL_N2_SIZE * 0.0274958766106), (-CHAFL_N2_SIZE * 0.0274958766106, CHAFL_N2_SIZE * 0.999621916911), (0, 0), align=None)
    extrude(amount=6, mode=Mode.SUBTRACT)
    with BuildSketch(Plane(origin=(-12.680783818, -13.428317012, 4), x_dir=(0.9996219169112968, 0, 0.02749587661058651), z_dir=(0, -1, 0))) as chafl_n2_piece_18a_section:
        Polygon((CHAFL_N2_SIZE * 0.999621916911, -CHAFL_N2_SIZE * 0.0274958766106), (-CHAFL_N2_SIZE * 0.0274958766106, -CHAFL_N2_SIZE * 0.999621916911), (0, 0), align=None)
    chafl_n2_piece_18a = extrude(amount=19.143365976, mode=Mode.PRIVATE)
    chafl_n2_piece_18a = split(chafl_n2_piece_18a, bisect_by=Plane(origin=(-12.350990191, -16, 3.670206373), z_dir=(0, 1, 0)), keep=Keep.TOP, mode=Mode.PRIVATE)
    with BuildSketch(Plane(origin=(-36.571682988, -16, 4), x_dir=(0, 0.9996219169112968, 0.02749587661058651), z_dir=(1, 0, 0))) as chafl_n2_piece_18b_section:
        Polygon((CHAFL_N2_SIZE * 0.999621916911, -CHAFL_N2_SIZE * 0.0274958766106), (-CHAFL_N2_SIZE * 0.0274958766106, -CHAFL_N2_SIZE * 0.999621916911), (0, 0), align=None)
    chafl_n2_piece_18b = extrude(amount=26.462582158, mode=Mode.PRIVATE)
    chafl_n2_piece_18b = split(chafl_n2_piece_18b, bisect_by=Plane(origin=(-12.680783818, -15.670206373, 3.670206373), z_dir=(1, 0, 0)), keep=Keep.TOP, mode=Mode.PRIVATE)
    chafl_n2_piece_18 = chafl_n2_piece_18a & chafl_n2_piece_18b
    add(chafl_n2_piece_18, mode=Mode.SUBTRACT)
    with BuildSketch(Plane(origin=(10.10910083, -16, 4), x_dir=(0, 0.9996219169112968, 0.02749587661058651), z_dir=(1, 0, 0))) as chafl_n2_piece_19a_section:
        Polygon((CHAFL_N2_SIZE * 0.999621916911, -CHAFL_N2_SIZE * 0.0274958766106), (-CHAFL_N2_SIZE * 0.0274958766106, -CHAFL_N2_SIZE * 0.999621916911), (0, 0), align=None)
    chafl_n2_piece_19a = extrude(amount=26.462582158, mode=Mode.PRIVATE)
    chafl_n2_piece_19a = split(chafl_n2_piece_19a, bisect_by=Plane(origin=(12.680783818, -15.670206373, 3.670206373), z_dir=(-1, 0, 0)), keep=Keep.TOP, mode=Mode.PRIVATE)
    with BuildSketch(Plane(origin=(12.680783818, -32.571682988, 4), x_dir=(-0.9996219169112968, 0, 0.02749587661058651), z_dir=(0, 1, 0))) as chafl_n2_piece_19b_section:
        Polygon((CHAFL_N2_SIZE * 0.999621916911, -CHAFL_N2_SIZE * 0.0274958766106), (-CHAFL_N2_SIZE * 0.0274958766106, -CHAFL_N2_SIZE * 0.999621916911), (0, 0), align=None)
    chafl_n2_piece_19b = extrude(amount=19.143365976, mode=Mode.PRIVATE)
    chafl_n2_piece_19b = split(chafl_n2_piece_19b, bisect_by=Plane(origin=(12.350990191, -16, 3.670206373), z_dir=(0, 1, 0)), keep=Keep.TOP, mode=Mode.PRIVATE)
    chafl_n2_piece_19 = chafl_n2_piece_19a & chafl_n2_piece_19b
    add(chafl_n2_piece_19, mode=Mode.SUBTRACT)
    with BuildSketch(Plane(origin=(36, -9.428317012, 4), x_dir=(0.02749587661058907, 0, -0.9996219169112965), z_dir=(0, -1, 0))) as chafl_n2_piece_20a_section:
        Polygon((CHAFL_N2_SIZE * 0.999621916911, -CHAFL_N2_SIZE * 0.0274958766106), (-CHAFL_N2_SIZE * 0.0274958766106, -CHAFL_N2_SIZE * 0.999621916911), (0, 0), align=None)
    chafl_n2_piece_20a = extrude(amount=7.143365976, mode=Mode.PRIVATE)
    chafl_n2_piece_20a = split(chafl_n2_piece_20a, bisect_by=Plane(origin=(35.670206373, -12, 3.670206373), z_dir=(0, 1, 0)), keep=Keep.TOP, mode=Mode.PRIVATE)
    with BuildSketch(Plane(origin=(33.428317012, -12, 4), x_dir=(0, 0.9996219169112968, 0.02749587661058651), z_dir=(1, 0, 0))) as chafl_n2_piece_20b_section:
        Polygon((CHAFL_N2_SIZE * 0.999621916911, -CHAFL_N2_SIZE * 0.0274958766106), (-CHAFL_N2_SIZE * 0.0274958766106, -CHAFL_N2_SIZE * 0.999621916911), (0, 0), align=None)
    chafl_n2_piece_20b = extrude(amount=32.571682988, mode=Mode.PRIVATE)
    chafl_n2_piece_20b = split(chafl_n2_piece_20b, bisect_by=Plane(origin=(36, -11.670206373, 3.670206373), z_dir=(-1, 0, 0)), keep=Keep.TOP, mode=Mode.PRIVATE)
    chafl_n2_piece_20 = chafl_n2_piece_20a & chafl_n2_piece_20b
    add(chafl_n2_piece_20, mode=Mode.SUBTRACT)
    with BuildSketch(Plane(origin=(-6.428317012, 12, 4), x_dir=(0, -0.9996219169112968, 0.02749587661058651), z_dir=(-1, 0, 0))) as chafl_n2_piece_21a_section:
        Polygon((CHAFL_N2_SIZE * 0.999621916911, -CHAFL_N2_SIZE * 0.0274958766106), (-CHAFL_N2_SIZE * 0.0274958766106, -CHAFL_N2_SIZE * 0.999621916911), (0, 0), align=None)
    chafl_n2_piece_21a = extrude(amount=30.143365976, mode=Mode.PRIVATE)
    chafl_n2_piece_21a = split(chafl_n2_piece_21a, bisect_by=Plane(origin=(-9, 11.670206373, 3.670206373), z_dir=(1, 0, 0)), keep=Keep.TOP, mode=Mode.PRIVATE)
    with BuildSketch(Plane(origin=(-9, 12, 10), x_dir=(0.9996219169112968, 0.027495876610585623, 0), z_dir=(0, 0, -1))) as chafl_n2_piece_21b_section:
        Polygon((CHAFL_N2_SIZE * 0.999621916911, CHAFL_N2_SIZE * 0.0274958766106), (-CHAFL_N2_SIZE * 0.0274958766106, CHAFL_N2_SIZE * 0.999621916911), (0, 0), align=None)
    chafl_n2_piece_21b = extrude(amount=8.571682988, mode=Mode.PRIVATE)
    chafl_n2_piece_21b = split(chafl_n2_piece_21b, bisect_by=Plane(origin=(-8.670206373, 11.670206373, 4), z_dir=(0, 0, -1)), keep=Keep.TOP, mode=Mode.PRIVATE)
    chafl_n2_piece_21 = chafl_n2_piece_21a & chafl_n2_piece_21b
    add(chafl_n2_piece_21, mode=Mode.SUBTRACT)
    with BuildSketch(Plane(origin=(66, 12, 4), x_dir=(0, -0.9996219169112968, 0.02749587661058651), z_dir=(-1, 0, 0))) as chafl_n2_piece_22a_section:
        Polygon((CHAFL_N2_SIZE * 0.999621916911, -CHAFL_N2_SIZE * 0.0274958766106), (-CHAFL_N2_SIZE * 0.0274958766106, -CHAFL_N2_SIZE * 0.999621916911), (0, 0), align=None)
    chafl_n2_piece_22a = extrude(amount=59.571682988, mode=Mode.PRIVATE)
    chafl_n2_piece_22a = split(chafl_n2_piece_22a, bisect_by=Plane(origin=(9, 11.670206373, 3.670206373), z_dir=(-1, 0, 0)), keep=Keep.TOP, mode=Mode.PRIVATE)
    with BuildSketch(Plane(origin=(9, 12, 1.428317012), x_dir=(-0.9996219169112968, 0.027495876610585623, 0), z_dir=(0, 0, 1))) as chafl_n2_piece_22b_section:
        Polygon((CHAFL_N2_SIZE * 0.999621916911, CHAFL_N2_SIZE * 0.0274958766106), (-CHAFL_N2_SIZE * 0.0274958766106, CHAFL_N2_SIZE * 0.999621916911), (0, 0), align=None)
    chafl_n2_piece_22b = extrude(amount=8.571682988, mode=Mode.PRIVATE)
    chafl_n2_piece_22b = split(chafl_n2_piece_22b, bisect_by=Plane(origin=(8.670206373, 11.670206373, 4), z_dir=(0, 0, -1)), keep=Keep.TOP, mode=Mode.PRIVATE)
    chafl_n2_piece_22 = chafl_n2_piece_22a & chafl_n2_piece_22b
    add(chafl_n2_piece_22, mode=Mode.SUBTRACT)

    # Croquis8 → Cortar-Extruir2 (cut, through all)
    with BuildSketch(Plane.XY.offset(4)):
        Rectangle(CROQUIS8_W, CROQUIS8_H)
    extrude(amount=-CORTAR_EXTRUIR2_DEPTH, mode=Mode.SUBTRACT)

    # Croquis9 → Cortar-Extruir3 (cut, through all)
    with BuildSketch(Plane.ZY.offset(36)):
        with Locations((-9.534602448, -11.97580254)):
            Rectangle(CROQUIS9_W, CROQUIS9_H)
    extrude(amount=-CORTAR_EXTRUIR3_DEPTH, mode=Mode.SUBTRACT)


solid = part.part
